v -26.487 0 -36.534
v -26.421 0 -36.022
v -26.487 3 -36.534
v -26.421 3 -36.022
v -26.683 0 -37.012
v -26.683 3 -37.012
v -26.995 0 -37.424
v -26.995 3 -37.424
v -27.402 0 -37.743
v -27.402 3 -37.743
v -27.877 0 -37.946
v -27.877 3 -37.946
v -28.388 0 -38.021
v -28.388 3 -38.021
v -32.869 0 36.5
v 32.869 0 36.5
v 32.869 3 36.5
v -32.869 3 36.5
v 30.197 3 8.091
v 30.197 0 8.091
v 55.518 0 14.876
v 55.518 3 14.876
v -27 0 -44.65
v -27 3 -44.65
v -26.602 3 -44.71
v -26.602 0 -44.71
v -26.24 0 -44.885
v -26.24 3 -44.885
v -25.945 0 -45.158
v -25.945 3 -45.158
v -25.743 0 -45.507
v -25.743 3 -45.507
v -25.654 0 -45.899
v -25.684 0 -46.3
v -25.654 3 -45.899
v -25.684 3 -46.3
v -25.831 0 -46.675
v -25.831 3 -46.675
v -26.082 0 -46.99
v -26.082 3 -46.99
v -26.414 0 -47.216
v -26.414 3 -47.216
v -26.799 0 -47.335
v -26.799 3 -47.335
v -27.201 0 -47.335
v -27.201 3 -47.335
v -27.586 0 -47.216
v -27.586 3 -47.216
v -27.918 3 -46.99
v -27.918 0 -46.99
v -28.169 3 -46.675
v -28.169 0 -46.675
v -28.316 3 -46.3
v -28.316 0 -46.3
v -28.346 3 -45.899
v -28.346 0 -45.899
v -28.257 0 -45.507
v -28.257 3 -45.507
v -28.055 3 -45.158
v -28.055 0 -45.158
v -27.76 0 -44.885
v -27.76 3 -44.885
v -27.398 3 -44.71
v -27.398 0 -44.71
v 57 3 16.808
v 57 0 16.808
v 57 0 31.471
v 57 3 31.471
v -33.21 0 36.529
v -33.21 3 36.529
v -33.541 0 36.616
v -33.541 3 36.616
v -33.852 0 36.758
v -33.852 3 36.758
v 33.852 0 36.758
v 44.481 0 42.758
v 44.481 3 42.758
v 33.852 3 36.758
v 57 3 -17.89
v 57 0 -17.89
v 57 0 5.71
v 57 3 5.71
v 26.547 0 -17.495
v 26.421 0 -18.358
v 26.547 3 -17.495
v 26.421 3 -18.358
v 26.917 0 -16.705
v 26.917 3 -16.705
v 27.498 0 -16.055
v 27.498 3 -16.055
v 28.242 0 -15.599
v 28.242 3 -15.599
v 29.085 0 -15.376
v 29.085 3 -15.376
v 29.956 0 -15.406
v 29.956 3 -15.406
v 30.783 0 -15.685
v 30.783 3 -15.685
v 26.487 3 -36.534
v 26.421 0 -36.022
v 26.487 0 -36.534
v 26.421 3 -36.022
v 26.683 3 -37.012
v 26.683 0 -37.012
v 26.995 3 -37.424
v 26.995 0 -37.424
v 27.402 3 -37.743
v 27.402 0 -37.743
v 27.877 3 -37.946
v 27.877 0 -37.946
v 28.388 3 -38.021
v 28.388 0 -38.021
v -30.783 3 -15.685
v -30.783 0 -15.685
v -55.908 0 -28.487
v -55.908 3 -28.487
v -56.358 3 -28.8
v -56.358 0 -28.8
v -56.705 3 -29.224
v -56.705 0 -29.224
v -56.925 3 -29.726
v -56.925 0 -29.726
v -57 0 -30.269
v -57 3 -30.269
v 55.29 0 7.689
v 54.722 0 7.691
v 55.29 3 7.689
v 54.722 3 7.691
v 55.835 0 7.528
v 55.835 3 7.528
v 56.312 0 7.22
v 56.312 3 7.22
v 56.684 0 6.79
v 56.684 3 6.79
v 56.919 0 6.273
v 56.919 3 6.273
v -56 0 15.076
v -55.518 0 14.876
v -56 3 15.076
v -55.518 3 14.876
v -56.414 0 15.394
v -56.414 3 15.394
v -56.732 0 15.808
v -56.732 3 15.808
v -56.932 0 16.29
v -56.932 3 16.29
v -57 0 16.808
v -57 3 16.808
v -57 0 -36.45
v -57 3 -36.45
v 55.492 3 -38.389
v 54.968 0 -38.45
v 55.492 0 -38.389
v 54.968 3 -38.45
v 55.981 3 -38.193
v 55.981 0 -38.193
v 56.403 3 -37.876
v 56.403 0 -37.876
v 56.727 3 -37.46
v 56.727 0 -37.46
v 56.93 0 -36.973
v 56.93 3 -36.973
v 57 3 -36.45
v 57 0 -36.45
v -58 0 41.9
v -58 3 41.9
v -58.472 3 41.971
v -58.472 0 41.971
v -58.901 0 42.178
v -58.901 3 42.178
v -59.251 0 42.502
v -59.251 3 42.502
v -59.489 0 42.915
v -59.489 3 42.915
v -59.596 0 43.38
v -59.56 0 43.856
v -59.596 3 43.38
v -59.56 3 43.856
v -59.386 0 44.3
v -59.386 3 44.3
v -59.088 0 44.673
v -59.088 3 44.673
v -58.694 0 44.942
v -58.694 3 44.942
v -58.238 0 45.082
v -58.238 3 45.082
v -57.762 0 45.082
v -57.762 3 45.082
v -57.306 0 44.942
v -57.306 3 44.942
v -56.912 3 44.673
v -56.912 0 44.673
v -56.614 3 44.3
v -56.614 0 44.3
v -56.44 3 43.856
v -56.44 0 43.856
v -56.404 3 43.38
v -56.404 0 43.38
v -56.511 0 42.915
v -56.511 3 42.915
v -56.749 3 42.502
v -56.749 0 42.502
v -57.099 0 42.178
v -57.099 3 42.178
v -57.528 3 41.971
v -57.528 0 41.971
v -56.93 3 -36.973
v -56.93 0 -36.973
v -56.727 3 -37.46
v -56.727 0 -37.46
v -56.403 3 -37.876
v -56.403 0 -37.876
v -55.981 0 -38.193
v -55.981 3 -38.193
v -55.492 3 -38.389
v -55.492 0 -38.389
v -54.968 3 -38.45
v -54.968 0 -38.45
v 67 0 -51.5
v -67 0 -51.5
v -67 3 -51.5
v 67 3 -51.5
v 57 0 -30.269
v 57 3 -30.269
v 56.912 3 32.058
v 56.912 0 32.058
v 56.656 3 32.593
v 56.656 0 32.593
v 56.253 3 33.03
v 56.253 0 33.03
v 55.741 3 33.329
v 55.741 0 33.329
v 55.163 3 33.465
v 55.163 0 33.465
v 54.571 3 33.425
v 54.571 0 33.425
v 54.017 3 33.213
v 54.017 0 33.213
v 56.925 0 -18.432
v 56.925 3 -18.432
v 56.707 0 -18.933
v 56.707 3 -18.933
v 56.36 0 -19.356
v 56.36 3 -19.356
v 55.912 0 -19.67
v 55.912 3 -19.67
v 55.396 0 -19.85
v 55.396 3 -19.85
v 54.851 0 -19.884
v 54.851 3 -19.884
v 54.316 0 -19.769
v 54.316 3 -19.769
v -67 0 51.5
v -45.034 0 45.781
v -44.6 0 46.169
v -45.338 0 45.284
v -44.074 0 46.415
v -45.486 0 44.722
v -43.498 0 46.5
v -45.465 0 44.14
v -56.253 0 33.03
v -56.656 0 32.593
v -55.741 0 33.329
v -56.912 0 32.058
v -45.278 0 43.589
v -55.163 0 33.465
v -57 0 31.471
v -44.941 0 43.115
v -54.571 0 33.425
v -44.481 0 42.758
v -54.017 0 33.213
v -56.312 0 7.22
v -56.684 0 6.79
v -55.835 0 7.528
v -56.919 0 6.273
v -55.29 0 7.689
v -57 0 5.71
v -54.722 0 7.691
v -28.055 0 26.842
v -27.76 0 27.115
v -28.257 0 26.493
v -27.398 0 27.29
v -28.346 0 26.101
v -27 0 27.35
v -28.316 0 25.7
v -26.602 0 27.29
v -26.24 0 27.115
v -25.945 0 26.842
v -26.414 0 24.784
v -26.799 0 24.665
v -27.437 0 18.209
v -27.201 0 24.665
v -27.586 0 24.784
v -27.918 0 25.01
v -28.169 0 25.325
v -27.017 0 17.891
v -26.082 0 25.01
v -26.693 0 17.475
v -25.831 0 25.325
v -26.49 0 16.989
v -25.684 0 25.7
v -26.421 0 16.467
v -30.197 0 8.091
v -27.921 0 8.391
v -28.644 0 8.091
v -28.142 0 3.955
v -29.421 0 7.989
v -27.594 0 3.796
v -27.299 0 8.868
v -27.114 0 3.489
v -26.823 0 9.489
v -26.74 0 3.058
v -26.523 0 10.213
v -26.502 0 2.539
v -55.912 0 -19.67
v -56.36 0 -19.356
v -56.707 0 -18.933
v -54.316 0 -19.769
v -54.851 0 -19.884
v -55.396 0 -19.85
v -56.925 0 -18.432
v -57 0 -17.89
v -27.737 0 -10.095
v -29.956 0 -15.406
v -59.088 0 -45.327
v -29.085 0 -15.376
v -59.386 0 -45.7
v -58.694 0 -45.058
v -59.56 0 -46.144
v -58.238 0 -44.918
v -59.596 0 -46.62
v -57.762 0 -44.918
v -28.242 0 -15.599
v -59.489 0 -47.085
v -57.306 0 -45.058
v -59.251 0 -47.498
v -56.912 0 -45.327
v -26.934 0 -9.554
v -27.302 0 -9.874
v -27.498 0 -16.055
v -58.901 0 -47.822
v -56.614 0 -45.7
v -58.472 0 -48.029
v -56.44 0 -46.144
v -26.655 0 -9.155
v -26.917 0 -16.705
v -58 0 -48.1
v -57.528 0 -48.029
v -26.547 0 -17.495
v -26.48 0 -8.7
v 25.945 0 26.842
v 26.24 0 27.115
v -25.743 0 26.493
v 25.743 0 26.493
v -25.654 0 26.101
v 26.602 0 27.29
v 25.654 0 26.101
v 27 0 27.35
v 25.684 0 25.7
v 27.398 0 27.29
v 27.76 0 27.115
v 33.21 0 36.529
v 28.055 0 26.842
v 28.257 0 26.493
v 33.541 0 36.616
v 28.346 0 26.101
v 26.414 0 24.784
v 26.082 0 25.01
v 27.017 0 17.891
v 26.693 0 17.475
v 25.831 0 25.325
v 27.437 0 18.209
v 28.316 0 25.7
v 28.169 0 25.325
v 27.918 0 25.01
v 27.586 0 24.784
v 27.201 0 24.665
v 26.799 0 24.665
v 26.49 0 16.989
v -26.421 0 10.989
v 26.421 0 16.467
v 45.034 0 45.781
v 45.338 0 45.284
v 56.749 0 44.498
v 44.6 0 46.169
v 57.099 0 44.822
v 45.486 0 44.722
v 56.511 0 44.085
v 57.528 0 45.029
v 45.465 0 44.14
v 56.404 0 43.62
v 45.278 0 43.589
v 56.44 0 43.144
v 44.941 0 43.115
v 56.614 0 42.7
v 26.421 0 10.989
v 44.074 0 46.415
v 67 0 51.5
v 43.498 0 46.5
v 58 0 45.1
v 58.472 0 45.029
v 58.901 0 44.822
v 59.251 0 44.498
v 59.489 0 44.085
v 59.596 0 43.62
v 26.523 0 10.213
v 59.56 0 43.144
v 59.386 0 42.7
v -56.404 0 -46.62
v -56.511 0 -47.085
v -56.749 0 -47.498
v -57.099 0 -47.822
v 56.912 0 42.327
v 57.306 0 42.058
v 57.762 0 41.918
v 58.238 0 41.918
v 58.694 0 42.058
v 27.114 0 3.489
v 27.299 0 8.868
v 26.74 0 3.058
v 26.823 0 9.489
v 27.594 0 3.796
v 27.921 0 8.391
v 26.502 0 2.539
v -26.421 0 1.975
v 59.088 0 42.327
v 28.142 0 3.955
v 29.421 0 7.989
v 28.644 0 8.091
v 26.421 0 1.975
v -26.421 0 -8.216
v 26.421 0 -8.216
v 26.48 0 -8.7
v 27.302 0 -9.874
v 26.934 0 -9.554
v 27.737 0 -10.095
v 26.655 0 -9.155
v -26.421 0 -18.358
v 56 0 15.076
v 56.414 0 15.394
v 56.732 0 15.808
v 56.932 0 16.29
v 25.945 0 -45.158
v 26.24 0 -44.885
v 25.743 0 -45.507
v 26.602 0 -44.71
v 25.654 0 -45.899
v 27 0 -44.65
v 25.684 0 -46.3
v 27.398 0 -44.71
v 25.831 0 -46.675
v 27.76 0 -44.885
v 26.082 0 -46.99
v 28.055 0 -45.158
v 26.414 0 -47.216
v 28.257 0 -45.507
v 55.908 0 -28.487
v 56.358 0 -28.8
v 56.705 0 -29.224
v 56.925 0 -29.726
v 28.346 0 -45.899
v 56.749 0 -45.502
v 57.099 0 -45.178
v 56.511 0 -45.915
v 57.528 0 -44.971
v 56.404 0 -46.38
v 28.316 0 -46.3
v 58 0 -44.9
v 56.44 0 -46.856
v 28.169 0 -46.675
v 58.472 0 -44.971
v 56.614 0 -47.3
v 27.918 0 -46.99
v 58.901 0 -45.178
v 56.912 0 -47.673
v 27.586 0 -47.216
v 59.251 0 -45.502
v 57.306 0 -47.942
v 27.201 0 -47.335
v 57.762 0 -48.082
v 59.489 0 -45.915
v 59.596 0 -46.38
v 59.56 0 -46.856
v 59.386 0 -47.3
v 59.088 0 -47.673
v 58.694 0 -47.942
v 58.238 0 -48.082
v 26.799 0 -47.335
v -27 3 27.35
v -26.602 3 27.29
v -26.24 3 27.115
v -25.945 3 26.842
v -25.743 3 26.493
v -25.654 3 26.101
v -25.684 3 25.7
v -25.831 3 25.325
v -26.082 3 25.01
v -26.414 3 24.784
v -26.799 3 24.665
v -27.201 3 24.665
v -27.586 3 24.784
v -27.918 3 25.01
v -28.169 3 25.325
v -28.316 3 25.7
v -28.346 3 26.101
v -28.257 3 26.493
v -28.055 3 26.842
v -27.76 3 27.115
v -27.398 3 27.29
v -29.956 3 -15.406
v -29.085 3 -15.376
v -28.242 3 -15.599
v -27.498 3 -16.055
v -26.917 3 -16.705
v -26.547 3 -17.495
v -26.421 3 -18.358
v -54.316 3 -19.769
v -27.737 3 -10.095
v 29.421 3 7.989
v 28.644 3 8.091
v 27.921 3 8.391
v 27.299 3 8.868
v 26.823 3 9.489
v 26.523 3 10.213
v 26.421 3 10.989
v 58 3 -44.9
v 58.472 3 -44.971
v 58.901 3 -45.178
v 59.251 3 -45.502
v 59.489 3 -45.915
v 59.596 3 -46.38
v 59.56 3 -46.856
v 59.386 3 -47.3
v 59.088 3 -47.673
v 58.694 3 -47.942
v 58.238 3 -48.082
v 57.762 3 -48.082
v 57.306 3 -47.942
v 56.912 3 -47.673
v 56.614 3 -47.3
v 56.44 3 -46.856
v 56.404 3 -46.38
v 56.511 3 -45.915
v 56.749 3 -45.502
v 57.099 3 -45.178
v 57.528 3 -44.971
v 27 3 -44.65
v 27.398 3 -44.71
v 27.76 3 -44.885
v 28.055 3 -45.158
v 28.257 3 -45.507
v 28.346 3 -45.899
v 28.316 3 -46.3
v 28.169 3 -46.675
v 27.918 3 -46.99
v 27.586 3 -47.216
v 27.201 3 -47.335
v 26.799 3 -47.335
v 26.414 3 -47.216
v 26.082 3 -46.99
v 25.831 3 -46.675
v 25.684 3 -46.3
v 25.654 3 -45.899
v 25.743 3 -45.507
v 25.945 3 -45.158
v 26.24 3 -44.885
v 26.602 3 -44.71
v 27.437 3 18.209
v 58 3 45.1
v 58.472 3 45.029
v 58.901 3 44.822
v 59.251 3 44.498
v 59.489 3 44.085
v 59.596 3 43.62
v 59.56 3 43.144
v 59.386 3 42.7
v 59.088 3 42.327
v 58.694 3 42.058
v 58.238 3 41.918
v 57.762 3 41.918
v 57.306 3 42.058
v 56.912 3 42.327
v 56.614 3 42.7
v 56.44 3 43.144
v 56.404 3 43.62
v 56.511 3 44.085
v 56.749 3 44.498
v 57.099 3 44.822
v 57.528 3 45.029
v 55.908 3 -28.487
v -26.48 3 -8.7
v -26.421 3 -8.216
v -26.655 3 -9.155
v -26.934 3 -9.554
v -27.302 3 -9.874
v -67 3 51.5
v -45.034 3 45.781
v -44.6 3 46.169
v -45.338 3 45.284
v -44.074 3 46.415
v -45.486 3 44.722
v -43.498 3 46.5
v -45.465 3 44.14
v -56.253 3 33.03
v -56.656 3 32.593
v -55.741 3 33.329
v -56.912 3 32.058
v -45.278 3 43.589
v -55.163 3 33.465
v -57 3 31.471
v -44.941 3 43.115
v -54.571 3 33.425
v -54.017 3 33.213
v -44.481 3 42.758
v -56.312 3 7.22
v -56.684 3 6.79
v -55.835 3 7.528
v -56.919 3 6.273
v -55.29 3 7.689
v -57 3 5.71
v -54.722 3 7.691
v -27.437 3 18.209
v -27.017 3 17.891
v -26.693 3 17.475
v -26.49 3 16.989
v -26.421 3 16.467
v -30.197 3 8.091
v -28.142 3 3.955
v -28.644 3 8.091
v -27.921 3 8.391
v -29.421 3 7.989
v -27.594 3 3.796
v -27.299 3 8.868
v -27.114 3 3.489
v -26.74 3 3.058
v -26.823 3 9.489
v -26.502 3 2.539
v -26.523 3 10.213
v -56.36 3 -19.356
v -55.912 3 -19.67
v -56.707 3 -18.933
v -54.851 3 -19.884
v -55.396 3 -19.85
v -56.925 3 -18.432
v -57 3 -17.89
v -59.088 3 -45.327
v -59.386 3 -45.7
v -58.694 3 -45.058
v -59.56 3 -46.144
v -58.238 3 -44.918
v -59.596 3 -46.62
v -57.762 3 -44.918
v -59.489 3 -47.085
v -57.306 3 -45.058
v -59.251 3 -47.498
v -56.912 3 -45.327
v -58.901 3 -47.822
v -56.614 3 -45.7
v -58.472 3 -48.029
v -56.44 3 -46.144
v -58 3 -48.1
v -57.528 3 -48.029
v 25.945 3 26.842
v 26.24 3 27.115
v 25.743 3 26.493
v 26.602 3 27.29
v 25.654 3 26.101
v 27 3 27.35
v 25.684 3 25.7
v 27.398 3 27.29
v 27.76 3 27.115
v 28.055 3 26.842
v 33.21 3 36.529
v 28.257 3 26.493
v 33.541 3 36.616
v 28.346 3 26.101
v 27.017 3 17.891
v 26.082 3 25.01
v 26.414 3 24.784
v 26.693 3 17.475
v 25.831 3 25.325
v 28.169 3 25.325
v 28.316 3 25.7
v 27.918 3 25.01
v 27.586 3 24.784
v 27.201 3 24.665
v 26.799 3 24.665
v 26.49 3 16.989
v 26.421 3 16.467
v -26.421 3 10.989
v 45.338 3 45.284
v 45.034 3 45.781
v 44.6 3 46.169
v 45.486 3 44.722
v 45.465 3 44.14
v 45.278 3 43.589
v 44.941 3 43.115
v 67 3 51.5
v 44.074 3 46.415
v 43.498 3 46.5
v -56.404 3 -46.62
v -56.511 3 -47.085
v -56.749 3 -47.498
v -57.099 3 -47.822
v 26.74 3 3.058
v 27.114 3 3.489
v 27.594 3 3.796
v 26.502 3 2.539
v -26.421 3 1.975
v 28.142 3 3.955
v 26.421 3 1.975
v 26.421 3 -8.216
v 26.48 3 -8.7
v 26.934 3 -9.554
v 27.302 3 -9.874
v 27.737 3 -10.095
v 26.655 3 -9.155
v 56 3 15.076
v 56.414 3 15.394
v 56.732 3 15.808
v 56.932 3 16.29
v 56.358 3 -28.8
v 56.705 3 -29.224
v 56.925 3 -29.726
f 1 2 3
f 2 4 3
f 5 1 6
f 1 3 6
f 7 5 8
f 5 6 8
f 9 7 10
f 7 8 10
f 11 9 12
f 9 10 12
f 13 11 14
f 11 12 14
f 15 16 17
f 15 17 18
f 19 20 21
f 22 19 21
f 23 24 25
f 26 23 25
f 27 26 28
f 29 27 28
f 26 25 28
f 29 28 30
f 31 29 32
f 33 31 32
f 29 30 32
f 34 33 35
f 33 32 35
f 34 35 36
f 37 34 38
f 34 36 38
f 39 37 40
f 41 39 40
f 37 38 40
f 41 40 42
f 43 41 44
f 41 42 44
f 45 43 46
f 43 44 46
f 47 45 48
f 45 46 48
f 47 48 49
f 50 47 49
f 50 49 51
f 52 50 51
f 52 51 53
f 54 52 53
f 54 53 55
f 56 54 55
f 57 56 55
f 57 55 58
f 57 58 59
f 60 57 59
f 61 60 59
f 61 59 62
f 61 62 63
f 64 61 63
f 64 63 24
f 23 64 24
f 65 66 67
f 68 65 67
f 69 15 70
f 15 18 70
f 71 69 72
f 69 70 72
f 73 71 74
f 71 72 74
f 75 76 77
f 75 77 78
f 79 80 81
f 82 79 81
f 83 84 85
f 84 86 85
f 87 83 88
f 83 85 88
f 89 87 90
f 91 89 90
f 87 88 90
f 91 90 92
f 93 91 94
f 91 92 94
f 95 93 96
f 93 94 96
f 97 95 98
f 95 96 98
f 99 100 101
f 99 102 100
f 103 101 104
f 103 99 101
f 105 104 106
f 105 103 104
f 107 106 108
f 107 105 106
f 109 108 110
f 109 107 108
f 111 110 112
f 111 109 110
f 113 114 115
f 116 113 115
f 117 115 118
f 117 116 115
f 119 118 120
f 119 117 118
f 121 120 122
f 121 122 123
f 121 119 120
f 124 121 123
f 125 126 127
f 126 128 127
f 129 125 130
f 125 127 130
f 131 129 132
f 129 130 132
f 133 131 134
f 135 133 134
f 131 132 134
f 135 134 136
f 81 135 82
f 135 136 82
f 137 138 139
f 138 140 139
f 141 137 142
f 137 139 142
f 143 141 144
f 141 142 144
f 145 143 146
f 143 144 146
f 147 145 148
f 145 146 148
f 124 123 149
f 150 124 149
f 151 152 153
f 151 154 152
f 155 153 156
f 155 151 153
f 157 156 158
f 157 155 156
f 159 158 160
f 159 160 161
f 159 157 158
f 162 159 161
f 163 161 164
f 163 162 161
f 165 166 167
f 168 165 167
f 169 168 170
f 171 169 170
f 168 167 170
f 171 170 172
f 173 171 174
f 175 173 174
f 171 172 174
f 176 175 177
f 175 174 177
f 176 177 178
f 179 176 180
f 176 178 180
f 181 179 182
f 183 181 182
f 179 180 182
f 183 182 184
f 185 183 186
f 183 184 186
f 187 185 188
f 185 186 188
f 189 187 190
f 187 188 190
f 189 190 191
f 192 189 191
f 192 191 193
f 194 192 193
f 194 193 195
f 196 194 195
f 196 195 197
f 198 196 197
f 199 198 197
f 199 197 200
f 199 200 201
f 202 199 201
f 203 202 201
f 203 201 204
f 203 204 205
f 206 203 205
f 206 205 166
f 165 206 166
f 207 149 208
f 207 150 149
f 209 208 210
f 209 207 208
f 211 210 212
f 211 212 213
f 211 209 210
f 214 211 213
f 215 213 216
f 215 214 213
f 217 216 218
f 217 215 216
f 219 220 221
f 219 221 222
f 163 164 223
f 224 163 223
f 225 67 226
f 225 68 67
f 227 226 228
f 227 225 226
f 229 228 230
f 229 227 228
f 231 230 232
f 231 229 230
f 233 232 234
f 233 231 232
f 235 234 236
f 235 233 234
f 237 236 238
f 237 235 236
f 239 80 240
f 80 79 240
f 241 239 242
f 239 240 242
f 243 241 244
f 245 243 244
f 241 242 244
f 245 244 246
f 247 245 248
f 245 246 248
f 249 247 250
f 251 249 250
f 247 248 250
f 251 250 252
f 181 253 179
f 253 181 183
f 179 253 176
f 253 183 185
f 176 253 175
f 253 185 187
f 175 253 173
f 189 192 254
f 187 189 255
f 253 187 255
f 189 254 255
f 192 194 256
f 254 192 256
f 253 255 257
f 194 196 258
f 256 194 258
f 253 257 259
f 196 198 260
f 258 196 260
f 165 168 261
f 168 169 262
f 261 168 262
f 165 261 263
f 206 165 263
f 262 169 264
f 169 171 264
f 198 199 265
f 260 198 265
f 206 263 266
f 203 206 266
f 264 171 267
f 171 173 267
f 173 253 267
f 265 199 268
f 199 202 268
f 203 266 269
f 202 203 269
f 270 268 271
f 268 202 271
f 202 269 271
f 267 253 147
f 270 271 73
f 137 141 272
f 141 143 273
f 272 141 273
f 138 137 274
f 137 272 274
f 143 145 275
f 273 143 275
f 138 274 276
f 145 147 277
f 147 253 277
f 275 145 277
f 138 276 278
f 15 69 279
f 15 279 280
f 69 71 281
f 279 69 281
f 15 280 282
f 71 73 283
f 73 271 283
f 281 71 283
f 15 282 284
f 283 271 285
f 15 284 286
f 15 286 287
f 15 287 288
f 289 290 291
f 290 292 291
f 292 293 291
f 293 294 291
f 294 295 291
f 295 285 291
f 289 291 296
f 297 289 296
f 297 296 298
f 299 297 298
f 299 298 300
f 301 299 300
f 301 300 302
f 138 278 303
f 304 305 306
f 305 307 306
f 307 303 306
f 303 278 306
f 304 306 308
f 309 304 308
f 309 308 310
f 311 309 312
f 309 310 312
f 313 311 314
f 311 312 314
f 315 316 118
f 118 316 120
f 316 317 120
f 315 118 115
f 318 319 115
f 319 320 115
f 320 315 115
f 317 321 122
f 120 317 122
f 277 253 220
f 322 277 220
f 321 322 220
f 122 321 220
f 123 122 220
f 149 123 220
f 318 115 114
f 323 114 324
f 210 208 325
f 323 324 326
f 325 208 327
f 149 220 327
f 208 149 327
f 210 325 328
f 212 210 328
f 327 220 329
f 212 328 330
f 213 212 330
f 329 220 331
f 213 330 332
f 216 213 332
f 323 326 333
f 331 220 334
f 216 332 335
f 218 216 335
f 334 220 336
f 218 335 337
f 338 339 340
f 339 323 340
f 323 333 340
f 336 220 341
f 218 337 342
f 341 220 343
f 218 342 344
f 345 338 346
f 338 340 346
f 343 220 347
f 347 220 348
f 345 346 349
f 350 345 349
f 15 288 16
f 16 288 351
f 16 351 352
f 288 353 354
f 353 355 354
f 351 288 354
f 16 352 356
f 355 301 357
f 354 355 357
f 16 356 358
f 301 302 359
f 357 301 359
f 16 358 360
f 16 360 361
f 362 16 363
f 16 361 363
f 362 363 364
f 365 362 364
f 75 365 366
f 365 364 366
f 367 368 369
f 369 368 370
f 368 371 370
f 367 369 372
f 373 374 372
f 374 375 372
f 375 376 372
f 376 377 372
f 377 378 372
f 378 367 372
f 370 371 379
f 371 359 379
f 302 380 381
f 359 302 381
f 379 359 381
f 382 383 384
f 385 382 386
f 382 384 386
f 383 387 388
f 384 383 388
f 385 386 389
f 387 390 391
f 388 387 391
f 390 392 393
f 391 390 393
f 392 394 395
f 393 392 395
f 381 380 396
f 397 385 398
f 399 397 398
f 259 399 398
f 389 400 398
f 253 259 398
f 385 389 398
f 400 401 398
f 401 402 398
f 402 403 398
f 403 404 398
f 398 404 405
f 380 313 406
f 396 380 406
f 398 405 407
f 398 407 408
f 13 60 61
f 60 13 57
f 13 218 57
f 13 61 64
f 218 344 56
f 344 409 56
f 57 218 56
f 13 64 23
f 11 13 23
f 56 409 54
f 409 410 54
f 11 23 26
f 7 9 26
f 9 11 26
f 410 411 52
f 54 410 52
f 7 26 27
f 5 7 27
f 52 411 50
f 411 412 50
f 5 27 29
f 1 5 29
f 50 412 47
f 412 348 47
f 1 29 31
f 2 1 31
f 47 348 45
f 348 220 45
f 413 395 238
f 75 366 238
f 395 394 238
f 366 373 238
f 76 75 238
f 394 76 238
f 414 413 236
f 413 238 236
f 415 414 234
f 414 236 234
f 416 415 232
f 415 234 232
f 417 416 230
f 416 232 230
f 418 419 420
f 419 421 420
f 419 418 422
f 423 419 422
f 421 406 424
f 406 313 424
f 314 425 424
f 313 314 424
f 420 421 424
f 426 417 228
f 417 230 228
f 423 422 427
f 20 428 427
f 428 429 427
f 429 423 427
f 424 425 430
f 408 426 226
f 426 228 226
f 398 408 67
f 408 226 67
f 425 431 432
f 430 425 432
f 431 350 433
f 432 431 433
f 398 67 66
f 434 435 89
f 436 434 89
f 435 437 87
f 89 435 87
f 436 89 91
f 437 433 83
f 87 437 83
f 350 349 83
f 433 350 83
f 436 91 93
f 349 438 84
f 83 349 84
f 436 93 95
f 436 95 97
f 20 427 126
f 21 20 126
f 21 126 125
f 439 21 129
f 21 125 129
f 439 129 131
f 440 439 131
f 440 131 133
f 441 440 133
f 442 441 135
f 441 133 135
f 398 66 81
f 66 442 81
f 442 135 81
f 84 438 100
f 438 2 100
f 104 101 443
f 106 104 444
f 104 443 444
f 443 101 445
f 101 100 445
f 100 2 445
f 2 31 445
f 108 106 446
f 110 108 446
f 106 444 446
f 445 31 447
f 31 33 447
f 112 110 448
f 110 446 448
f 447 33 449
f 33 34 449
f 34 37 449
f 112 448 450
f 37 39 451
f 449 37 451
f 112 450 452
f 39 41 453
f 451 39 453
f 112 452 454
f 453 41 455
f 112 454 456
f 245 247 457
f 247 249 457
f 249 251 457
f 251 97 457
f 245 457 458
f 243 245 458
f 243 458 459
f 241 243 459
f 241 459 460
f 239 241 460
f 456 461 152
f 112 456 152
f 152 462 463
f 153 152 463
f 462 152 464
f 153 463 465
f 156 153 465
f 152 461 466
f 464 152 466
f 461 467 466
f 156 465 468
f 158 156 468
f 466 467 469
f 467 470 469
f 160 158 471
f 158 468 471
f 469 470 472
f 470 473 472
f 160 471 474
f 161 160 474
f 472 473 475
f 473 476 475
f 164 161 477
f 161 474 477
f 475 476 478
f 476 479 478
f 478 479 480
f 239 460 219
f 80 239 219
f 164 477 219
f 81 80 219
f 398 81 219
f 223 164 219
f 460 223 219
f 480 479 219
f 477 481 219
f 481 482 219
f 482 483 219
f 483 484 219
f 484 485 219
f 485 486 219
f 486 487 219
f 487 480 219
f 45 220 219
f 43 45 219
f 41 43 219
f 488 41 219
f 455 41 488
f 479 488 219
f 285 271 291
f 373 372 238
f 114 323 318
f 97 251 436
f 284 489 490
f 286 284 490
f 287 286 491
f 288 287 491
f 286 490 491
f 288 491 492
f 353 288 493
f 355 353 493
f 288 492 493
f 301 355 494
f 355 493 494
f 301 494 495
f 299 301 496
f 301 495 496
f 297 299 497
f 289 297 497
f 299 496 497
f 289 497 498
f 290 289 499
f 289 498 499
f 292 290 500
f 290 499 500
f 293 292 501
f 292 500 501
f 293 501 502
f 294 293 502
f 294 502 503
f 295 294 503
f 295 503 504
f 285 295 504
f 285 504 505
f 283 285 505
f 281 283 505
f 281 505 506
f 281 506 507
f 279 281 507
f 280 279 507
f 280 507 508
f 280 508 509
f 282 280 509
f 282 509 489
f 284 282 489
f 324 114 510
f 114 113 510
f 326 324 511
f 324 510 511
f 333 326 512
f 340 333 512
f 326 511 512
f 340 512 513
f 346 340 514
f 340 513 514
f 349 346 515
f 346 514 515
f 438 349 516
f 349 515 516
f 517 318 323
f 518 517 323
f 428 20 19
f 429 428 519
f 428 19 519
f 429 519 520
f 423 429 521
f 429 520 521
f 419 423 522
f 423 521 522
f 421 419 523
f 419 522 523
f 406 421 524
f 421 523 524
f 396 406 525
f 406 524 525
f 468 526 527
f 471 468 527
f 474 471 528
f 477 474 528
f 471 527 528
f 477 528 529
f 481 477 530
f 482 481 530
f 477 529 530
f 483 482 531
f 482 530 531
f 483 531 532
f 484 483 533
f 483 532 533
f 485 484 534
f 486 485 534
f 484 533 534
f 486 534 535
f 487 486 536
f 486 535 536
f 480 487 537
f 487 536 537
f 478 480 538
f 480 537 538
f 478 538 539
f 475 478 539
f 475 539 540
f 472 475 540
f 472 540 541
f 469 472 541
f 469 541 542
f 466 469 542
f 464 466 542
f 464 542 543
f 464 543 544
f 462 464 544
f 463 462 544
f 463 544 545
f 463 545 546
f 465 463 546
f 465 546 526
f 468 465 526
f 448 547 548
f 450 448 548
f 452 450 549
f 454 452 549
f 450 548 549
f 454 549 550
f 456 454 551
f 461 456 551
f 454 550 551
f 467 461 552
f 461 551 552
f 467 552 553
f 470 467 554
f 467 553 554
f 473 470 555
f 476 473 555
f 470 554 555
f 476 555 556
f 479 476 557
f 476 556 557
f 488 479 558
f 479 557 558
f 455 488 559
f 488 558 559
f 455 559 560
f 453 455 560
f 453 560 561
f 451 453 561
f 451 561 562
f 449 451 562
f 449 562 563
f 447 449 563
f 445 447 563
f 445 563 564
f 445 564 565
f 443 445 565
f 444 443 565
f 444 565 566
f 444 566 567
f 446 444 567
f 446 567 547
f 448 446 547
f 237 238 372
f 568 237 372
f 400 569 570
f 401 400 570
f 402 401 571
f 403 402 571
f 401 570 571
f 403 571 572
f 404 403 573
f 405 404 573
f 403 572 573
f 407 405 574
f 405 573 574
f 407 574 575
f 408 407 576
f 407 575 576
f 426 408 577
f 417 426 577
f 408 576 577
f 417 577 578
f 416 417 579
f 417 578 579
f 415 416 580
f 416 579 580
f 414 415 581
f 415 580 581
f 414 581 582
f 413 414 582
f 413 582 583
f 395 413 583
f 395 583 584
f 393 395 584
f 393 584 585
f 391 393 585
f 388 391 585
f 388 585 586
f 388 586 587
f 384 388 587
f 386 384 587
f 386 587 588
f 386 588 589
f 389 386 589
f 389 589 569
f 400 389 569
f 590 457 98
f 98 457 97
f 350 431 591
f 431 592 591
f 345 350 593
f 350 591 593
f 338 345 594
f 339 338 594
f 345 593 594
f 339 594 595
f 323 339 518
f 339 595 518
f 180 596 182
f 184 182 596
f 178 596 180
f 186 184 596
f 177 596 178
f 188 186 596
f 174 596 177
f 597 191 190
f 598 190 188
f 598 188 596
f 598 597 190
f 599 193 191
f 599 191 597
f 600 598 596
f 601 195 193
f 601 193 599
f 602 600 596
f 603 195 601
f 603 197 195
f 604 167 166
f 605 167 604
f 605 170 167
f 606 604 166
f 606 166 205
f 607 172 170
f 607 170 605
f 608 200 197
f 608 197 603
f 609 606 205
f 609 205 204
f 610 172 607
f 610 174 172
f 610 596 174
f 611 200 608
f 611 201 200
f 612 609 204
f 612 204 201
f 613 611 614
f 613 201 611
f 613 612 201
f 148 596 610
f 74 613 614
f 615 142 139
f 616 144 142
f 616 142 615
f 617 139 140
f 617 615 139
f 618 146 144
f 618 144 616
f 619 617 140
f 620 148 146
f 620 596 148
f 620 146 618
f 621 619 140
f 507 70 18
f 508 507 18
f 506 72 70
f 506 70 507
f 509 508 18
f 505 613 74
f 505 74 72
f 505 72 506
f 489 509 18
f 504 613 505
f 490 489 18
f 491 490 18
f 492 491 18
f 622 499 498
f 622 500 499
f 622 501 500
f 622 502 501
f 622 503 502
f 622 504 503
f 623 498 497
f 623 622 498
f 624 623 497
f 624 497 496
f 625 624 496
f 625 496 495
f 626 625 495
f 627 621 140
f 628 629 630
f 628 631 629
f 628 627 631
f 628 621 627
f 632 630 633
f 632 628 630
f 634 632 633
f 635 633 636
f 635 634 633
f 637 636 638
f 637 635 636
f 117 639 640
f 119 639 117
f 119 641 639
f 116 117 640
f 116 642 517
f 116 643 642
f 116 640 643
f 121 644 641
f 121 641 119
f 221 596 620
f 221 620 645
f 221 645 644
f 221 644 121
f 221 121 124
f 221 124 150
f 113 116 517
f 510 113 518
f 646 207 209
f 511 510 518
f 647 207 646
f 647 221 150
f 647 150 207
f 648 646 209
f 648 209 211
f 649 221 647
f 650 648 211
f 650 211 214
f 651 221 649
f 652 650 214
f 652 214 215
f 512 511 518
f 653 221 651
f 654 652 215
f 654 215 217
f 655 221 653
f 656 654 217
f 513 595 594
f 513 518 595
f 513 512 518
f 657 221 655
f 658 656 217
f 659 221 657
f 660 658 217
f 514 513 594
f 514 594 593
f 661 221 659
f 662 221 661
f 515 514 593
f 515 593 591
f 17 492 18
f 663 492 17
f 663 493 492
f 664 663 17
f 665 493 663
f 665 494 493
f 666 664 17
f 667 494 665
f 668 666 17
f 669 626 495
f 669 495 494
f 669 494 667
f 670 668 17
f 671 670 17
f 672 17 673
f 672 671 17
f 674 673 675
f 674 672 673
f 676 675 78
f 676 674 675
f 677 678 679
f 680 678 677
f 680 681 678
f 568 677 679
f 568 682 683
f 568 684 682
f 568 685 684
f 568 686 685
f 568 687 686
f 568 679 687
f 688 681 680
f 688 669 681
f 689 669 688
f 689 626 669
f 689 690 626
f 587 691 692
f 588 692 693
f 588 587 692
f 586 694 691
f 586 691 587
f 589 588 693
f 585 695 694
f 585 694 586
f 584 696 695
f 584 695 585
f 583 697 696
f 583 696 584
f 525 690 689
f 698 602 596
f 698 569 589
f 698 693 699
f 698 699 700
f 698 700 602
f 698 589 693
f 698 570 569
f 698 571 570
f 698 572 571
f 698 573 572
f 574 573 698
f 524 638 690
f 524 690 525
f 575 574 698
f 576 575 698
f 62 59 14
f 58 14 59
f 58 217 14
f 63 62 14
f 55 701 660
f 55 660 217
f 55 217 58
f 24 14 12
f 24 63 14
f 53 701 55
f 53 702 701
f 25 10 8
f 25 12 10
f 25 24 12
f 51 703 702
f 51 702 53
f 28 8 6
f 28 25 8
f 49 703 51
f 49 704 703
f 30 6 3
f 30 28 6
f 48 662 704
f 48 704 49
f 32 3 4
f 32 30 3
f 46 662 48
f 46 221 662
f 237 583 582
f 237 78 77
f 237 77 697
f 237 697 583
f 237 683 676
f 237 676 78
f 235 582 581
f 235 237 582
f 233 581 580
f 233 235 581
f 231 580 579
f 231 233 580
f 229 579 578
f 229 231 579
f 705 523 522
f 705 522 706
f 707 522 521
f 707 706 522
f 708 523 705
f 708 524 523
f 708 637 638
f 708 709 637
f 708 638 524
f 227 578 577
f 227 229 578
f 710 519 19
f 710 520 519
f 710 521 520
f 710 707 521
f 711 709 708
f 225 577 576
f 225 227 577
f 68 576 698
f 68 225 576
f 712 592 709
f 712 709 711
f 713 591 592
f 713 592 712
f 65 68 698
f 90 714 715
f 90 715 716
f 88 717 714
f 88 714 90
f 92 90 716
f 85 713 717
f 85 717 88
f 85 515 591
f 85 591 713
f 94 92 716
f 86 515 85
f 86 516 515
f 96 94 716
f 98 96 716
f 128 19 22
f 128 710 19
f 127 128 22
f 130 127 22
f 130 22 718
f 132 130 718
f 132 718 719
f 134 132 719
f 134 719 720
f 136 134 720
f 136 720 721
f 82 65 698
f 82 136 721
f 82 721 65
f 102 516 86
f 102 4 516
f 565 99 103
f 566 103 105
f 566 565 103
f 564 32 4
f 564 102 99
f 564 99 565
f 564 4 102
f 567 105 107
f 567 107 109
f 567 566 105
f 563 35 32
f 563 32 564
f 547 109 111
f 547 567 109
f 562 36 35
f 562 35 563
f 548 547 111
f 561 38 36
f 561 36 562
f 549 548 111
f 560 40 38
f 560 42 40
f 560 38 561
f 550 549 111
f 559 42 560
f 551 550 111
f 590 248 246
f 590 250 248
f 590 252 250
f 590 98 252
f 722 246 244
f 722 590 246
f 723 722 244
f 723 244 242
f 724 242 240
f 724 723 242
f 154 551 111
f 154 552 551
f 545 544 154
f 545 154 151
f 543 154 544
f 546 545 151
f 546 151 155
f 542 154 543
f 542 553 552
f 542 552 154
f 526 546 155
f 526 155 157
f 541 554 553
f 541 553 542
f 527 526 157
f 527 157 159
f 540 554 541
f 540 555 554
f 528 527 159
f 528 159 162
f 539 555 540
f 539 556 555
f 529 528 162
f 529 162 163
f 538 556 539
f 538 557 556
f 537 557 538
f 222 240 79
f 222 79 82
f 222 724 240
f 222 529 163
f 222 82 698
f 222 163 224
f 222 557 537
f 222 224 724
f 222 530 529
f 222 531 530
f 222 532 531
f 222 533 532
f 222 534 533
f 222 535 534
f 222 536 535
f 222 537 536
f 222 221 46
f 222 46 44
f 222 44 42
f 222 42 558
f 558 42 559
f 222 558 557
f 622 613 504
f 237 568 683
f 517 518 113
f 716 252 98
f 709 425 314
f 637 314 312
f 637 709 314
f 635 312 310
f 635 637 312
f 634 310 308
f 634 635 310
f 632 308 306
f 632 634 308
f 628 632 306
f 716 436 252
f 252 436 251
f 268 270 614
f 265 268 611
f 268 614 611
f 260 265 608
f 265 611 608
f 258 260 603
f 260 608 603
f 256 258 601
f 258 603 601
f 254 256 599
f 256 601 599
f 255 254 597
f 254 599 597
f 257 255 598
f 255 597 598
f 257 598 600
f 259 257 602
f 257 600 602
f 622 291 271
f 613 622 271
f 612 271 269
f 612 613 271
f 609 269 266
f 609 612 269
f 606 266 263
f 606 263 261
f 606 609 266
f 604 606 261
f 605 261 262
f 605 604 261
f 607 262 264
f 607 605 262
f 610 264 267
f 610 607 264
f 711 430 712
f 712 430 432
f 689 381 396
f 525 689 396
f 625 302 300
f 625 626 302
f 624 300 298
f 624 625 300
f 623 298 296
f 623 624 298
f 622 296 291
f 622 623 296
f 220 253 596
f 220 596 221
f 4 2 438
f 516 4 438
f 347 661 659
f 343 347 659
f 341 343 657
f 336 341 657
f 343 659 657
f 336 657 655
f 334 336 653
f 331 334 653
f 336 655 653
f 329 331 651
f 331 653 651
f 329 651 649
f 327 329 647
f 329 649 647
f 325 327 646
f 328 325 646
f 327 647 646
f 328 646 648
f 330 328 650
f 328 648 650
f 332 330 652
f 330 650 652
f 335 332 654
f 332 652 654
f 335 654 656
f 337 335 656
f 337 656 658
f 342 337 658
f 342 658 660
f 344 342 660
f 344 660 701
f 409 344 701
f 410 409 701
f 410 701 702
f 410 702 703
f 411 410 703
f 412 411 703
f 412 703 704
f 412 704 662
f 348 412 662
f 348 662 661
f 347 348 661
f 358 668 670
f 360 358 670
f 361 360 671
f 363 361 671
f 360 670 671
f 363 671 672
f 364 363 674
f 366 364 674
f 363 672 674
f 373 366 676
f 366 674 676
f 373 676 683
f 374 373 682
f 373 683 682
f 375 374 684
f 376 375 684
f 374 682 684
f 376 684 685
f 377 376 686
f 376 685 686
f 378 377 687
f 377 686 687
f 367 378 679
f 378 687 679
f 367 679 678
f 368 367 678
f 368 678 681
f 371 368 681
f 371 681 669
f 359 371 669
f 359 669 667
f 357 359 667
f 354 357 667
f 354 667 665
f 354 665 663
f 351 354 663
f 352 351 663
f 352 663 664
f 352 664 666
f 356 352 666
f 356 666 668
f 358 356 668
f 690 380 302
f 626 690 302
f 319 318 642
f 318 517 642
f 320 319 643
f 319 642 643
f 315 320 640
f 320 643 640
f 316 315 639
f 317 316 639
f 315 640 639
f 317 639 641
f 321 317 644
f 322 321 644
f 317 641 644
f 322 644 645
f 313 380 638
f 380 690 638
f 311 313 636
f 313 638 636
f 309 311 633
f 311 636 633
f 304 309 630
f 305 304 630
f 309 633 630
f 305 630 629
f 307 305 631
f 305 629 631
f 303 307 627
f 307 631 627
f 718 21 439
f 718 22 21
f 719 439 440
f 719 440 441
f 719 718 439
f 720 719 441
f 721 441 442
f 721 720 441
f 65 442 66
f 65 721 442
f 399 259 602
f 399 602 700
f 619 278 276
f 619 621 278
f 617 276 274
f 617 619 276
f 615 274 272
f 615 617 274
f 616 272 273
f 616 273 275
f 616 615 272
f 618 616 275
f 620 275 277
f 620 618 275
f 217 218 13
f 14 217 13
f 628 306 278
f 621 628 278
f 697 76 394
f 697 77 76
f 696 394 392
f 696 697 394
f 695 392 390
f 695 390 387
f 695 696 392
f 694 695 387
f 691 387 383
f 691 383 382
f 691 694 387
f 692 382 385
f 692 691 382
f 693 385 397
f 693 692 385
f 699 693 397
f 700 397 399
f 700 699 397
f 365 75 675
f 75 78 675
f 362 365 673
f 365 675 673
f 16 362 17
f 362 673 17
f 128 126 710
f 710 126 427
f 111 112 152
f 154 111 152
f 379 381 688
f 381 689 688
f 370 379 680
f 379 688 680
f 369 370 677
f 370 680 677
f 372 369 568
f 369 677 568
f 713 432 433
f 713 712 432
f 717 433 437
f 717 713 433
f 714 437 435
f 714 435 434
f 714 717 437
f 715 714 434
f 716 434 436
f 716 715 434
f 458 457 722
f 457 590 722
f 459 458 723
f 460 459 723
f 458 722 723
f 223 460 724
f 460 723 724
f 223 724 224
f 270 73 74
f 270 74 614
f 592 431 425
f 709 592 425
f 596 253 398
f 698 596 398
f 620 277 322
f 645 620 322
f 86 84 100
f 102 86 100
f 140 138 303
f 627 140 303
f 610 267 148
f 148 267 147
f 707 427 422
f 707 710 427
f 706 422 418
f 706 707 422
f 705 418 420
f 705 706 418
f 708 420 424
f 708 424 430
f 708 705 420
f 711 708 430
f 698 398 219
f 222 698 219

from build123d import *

# Parameters (mm, degrees)
SKETCH_1_W          = 134
SKETCH_1_H          = 103
EXTRUDE_1_DEPTH     = 3
SKETCH_5_R          = 1.35
CUT_EXTRUDE_3_DEPTH = 85.559150895
SKETCH_6_R          = 1.6
CUT_EXTRUDE_4_DEPTH = 85.559150895
CUT_EXTRUDE_5_DEPTH = 85.559150895
FILLET_1_R          = 3
CUT_EXTRUDE_6_DEPTH = 85.559150895
FILLET_2_R          = 2


with BuildPart() as part:
    # 草图1 → 凸台-拉伸1 (new body)
    with BuildSketch(Plane(origin=(0, 0, 0), x_dir=(1, 0, 0), z_dir=(0, 1, 0))):
        Rectangle(SKETCH_1_W, SKETCH_1_H)
    extrude(amount=EXTRUDE_1_DEPTH)

    # 草图5 → 切除-拉伸3 (cut, through all)
    with BuildSketch(Plane(origin=(0, 3, 0), x_dir=(1, 0, 0), z_dir=(0, 1, 0))):
        with Locations(Location((27, -26, 0), (0, 0, 270))):
            Circle(SKETCH_5_R)
        with Locations(Location((-27, -26, 0), (0, 0, 270))):
            Circle(SKETCH_5_R)
        with Locations(Location((27, 46, 0), (0, 0, 270))):
            Circle(SKETCH_5_R)
        with Locations(Location((-27, 46, 0), (0, 0, 270))):
            Circle(SKETCH_5_R)
    extrude(amount=-CUT_EXTRUDE_3_DEPTH, mode=Mode.SUBTRACT)

    # 草图6 → 切除-拉伸4 (cut, through all)
    with BuildSketch(Plane(origin=(0, 3, 0), x_dir=(1, 0, 0), z_dir=(0, 1, 0))):
        with Locations(Location((58, 46.5, 0), (0, 0, 270))):
            Circle(SKETCH_6_R)
        with Locations(Location((58, -43.5, 0), (0, 0, 270))):
            Circle(SKETCH_6_R)
        with Locations(Location((-58, 46.5, 0), (0, 0, 90))):
            Circle(SKETCH_6_R)
        with Locations(Location((-58, -43.5, 0), (0, 0, 90))):
            Circle(SKETCH_6_R)
    extrude(amount=-CUT_EXTRUDE_4_DEPTH, mode=Mode.SUBTRACT)

    # 草图7 → 切除-拉伸5 (cut, through all)
    with BuildSketch(Plane.XZ):
        Polygon((-26.4206829, 17.634605341), (-57, 34.897123059), (-57, 15.273103969), (-26.4206829, 7.079400646), align=None)
        Polygon((-26.4206829, 3.713184828), (-57, 8.010827578), (-57, -20.746303353), (-26.4206829, -9.616342144), align=None)
        Polygon((-26.4206829, -37.989615661), (-26.4206829, -13.46201033), (-57, -29.042950621), (-57, -38.482830453), align=None)
        Polygon((57, -29.042950621), (26.4206829, -13.46201033), (26.4206829, -37.989615661), (57, -38.482830453), align=None)
        Polygon((26.4206829, 3.713184828), (26.4206829, -9.616342144), (57, -20.746303353), (57, 8.010827578), align=None)
        Polygon((26.4206829, 17.634605341), (26.4206829, 7.079400646), (57, 15.273103969), (57, 34.897123059), align=None)
    extrude(amount=-CUT_EXTRUDE_5_DEPTH, mode=Mode.SUBTRACT)

    # 圆角1
    fillet_1_edges = [part.edges().sort_by_distance(p)[0] for p in [
        (-26.4206829, 1.5, 7.079400646),
        (-26.4206829, 1.5, -13.46201033),
        (26.4206829, 1.5, -13.46201033),
        (26.4206829, 1.5, 7.079400646),
    ]]
    fillet(fillet_1_edges, radius=FILLET_1_R)

    # 草图9 → 切除-拉伸6 (cut, through all)
    with BuildSketch(Plane.XZ):
        Polygon((51.109101135, 46.5), (33.394815421, 36.5), (-33.394815421, 36.5), (-51.109101135, 46.5), align=None)
    extrude(amount=-CUT_EXTRUDE_6_DEPTH, mode=Mode.SUBTRACT)

    # 圆角2
    fillet_2_edges = [part.edges().sort_by_distance(p)[0] for p in [
        (-57, 1.5, 15.273103969),
        (-57, 1.5, 34.897123059),
        (-26.4206829, 1.5, 17.634605341),
        (-51.109101135, 1.5, 46.5),
        (51.109101135, 1.5, 46.5),
        (33.394815421, 1.5, 36.5),
        (-33.394815421, 1.5, 36.5),
        (-26.4206829, 1.5, -37.989615661),
        (-57, 1.5, -38.482830453),
        (-57, 1.5, -29.042950621),
        (-26.4206829, 1.5, -9.616342144),
        (-57, 1.5, -20.746303353),
        (-57, 1.5, 8.010827578),
        (-26.4206829, 1.5, 3.713184828),
        (26.4206829, 1.5, 3.713184828),
        (57, 1.5, 8.010827578),
        (57, 1.5, -20.746303353),
        (26.4206829, 1.5, -9.616342144),
        (57, 1.5, -29.042950621),
        (57, 1.5, -38.482830453),
        (26.4206829, 1.5, -37.989615661),
        (26.4206829, 1.5, 17.634605341),
        (57, 1.5, 34.897123059),
        (57, 1.5, 15.273103969),
    ]]
    fillet(fillet_2_edges, radius=FILLET_2_R)


solid = part.part
